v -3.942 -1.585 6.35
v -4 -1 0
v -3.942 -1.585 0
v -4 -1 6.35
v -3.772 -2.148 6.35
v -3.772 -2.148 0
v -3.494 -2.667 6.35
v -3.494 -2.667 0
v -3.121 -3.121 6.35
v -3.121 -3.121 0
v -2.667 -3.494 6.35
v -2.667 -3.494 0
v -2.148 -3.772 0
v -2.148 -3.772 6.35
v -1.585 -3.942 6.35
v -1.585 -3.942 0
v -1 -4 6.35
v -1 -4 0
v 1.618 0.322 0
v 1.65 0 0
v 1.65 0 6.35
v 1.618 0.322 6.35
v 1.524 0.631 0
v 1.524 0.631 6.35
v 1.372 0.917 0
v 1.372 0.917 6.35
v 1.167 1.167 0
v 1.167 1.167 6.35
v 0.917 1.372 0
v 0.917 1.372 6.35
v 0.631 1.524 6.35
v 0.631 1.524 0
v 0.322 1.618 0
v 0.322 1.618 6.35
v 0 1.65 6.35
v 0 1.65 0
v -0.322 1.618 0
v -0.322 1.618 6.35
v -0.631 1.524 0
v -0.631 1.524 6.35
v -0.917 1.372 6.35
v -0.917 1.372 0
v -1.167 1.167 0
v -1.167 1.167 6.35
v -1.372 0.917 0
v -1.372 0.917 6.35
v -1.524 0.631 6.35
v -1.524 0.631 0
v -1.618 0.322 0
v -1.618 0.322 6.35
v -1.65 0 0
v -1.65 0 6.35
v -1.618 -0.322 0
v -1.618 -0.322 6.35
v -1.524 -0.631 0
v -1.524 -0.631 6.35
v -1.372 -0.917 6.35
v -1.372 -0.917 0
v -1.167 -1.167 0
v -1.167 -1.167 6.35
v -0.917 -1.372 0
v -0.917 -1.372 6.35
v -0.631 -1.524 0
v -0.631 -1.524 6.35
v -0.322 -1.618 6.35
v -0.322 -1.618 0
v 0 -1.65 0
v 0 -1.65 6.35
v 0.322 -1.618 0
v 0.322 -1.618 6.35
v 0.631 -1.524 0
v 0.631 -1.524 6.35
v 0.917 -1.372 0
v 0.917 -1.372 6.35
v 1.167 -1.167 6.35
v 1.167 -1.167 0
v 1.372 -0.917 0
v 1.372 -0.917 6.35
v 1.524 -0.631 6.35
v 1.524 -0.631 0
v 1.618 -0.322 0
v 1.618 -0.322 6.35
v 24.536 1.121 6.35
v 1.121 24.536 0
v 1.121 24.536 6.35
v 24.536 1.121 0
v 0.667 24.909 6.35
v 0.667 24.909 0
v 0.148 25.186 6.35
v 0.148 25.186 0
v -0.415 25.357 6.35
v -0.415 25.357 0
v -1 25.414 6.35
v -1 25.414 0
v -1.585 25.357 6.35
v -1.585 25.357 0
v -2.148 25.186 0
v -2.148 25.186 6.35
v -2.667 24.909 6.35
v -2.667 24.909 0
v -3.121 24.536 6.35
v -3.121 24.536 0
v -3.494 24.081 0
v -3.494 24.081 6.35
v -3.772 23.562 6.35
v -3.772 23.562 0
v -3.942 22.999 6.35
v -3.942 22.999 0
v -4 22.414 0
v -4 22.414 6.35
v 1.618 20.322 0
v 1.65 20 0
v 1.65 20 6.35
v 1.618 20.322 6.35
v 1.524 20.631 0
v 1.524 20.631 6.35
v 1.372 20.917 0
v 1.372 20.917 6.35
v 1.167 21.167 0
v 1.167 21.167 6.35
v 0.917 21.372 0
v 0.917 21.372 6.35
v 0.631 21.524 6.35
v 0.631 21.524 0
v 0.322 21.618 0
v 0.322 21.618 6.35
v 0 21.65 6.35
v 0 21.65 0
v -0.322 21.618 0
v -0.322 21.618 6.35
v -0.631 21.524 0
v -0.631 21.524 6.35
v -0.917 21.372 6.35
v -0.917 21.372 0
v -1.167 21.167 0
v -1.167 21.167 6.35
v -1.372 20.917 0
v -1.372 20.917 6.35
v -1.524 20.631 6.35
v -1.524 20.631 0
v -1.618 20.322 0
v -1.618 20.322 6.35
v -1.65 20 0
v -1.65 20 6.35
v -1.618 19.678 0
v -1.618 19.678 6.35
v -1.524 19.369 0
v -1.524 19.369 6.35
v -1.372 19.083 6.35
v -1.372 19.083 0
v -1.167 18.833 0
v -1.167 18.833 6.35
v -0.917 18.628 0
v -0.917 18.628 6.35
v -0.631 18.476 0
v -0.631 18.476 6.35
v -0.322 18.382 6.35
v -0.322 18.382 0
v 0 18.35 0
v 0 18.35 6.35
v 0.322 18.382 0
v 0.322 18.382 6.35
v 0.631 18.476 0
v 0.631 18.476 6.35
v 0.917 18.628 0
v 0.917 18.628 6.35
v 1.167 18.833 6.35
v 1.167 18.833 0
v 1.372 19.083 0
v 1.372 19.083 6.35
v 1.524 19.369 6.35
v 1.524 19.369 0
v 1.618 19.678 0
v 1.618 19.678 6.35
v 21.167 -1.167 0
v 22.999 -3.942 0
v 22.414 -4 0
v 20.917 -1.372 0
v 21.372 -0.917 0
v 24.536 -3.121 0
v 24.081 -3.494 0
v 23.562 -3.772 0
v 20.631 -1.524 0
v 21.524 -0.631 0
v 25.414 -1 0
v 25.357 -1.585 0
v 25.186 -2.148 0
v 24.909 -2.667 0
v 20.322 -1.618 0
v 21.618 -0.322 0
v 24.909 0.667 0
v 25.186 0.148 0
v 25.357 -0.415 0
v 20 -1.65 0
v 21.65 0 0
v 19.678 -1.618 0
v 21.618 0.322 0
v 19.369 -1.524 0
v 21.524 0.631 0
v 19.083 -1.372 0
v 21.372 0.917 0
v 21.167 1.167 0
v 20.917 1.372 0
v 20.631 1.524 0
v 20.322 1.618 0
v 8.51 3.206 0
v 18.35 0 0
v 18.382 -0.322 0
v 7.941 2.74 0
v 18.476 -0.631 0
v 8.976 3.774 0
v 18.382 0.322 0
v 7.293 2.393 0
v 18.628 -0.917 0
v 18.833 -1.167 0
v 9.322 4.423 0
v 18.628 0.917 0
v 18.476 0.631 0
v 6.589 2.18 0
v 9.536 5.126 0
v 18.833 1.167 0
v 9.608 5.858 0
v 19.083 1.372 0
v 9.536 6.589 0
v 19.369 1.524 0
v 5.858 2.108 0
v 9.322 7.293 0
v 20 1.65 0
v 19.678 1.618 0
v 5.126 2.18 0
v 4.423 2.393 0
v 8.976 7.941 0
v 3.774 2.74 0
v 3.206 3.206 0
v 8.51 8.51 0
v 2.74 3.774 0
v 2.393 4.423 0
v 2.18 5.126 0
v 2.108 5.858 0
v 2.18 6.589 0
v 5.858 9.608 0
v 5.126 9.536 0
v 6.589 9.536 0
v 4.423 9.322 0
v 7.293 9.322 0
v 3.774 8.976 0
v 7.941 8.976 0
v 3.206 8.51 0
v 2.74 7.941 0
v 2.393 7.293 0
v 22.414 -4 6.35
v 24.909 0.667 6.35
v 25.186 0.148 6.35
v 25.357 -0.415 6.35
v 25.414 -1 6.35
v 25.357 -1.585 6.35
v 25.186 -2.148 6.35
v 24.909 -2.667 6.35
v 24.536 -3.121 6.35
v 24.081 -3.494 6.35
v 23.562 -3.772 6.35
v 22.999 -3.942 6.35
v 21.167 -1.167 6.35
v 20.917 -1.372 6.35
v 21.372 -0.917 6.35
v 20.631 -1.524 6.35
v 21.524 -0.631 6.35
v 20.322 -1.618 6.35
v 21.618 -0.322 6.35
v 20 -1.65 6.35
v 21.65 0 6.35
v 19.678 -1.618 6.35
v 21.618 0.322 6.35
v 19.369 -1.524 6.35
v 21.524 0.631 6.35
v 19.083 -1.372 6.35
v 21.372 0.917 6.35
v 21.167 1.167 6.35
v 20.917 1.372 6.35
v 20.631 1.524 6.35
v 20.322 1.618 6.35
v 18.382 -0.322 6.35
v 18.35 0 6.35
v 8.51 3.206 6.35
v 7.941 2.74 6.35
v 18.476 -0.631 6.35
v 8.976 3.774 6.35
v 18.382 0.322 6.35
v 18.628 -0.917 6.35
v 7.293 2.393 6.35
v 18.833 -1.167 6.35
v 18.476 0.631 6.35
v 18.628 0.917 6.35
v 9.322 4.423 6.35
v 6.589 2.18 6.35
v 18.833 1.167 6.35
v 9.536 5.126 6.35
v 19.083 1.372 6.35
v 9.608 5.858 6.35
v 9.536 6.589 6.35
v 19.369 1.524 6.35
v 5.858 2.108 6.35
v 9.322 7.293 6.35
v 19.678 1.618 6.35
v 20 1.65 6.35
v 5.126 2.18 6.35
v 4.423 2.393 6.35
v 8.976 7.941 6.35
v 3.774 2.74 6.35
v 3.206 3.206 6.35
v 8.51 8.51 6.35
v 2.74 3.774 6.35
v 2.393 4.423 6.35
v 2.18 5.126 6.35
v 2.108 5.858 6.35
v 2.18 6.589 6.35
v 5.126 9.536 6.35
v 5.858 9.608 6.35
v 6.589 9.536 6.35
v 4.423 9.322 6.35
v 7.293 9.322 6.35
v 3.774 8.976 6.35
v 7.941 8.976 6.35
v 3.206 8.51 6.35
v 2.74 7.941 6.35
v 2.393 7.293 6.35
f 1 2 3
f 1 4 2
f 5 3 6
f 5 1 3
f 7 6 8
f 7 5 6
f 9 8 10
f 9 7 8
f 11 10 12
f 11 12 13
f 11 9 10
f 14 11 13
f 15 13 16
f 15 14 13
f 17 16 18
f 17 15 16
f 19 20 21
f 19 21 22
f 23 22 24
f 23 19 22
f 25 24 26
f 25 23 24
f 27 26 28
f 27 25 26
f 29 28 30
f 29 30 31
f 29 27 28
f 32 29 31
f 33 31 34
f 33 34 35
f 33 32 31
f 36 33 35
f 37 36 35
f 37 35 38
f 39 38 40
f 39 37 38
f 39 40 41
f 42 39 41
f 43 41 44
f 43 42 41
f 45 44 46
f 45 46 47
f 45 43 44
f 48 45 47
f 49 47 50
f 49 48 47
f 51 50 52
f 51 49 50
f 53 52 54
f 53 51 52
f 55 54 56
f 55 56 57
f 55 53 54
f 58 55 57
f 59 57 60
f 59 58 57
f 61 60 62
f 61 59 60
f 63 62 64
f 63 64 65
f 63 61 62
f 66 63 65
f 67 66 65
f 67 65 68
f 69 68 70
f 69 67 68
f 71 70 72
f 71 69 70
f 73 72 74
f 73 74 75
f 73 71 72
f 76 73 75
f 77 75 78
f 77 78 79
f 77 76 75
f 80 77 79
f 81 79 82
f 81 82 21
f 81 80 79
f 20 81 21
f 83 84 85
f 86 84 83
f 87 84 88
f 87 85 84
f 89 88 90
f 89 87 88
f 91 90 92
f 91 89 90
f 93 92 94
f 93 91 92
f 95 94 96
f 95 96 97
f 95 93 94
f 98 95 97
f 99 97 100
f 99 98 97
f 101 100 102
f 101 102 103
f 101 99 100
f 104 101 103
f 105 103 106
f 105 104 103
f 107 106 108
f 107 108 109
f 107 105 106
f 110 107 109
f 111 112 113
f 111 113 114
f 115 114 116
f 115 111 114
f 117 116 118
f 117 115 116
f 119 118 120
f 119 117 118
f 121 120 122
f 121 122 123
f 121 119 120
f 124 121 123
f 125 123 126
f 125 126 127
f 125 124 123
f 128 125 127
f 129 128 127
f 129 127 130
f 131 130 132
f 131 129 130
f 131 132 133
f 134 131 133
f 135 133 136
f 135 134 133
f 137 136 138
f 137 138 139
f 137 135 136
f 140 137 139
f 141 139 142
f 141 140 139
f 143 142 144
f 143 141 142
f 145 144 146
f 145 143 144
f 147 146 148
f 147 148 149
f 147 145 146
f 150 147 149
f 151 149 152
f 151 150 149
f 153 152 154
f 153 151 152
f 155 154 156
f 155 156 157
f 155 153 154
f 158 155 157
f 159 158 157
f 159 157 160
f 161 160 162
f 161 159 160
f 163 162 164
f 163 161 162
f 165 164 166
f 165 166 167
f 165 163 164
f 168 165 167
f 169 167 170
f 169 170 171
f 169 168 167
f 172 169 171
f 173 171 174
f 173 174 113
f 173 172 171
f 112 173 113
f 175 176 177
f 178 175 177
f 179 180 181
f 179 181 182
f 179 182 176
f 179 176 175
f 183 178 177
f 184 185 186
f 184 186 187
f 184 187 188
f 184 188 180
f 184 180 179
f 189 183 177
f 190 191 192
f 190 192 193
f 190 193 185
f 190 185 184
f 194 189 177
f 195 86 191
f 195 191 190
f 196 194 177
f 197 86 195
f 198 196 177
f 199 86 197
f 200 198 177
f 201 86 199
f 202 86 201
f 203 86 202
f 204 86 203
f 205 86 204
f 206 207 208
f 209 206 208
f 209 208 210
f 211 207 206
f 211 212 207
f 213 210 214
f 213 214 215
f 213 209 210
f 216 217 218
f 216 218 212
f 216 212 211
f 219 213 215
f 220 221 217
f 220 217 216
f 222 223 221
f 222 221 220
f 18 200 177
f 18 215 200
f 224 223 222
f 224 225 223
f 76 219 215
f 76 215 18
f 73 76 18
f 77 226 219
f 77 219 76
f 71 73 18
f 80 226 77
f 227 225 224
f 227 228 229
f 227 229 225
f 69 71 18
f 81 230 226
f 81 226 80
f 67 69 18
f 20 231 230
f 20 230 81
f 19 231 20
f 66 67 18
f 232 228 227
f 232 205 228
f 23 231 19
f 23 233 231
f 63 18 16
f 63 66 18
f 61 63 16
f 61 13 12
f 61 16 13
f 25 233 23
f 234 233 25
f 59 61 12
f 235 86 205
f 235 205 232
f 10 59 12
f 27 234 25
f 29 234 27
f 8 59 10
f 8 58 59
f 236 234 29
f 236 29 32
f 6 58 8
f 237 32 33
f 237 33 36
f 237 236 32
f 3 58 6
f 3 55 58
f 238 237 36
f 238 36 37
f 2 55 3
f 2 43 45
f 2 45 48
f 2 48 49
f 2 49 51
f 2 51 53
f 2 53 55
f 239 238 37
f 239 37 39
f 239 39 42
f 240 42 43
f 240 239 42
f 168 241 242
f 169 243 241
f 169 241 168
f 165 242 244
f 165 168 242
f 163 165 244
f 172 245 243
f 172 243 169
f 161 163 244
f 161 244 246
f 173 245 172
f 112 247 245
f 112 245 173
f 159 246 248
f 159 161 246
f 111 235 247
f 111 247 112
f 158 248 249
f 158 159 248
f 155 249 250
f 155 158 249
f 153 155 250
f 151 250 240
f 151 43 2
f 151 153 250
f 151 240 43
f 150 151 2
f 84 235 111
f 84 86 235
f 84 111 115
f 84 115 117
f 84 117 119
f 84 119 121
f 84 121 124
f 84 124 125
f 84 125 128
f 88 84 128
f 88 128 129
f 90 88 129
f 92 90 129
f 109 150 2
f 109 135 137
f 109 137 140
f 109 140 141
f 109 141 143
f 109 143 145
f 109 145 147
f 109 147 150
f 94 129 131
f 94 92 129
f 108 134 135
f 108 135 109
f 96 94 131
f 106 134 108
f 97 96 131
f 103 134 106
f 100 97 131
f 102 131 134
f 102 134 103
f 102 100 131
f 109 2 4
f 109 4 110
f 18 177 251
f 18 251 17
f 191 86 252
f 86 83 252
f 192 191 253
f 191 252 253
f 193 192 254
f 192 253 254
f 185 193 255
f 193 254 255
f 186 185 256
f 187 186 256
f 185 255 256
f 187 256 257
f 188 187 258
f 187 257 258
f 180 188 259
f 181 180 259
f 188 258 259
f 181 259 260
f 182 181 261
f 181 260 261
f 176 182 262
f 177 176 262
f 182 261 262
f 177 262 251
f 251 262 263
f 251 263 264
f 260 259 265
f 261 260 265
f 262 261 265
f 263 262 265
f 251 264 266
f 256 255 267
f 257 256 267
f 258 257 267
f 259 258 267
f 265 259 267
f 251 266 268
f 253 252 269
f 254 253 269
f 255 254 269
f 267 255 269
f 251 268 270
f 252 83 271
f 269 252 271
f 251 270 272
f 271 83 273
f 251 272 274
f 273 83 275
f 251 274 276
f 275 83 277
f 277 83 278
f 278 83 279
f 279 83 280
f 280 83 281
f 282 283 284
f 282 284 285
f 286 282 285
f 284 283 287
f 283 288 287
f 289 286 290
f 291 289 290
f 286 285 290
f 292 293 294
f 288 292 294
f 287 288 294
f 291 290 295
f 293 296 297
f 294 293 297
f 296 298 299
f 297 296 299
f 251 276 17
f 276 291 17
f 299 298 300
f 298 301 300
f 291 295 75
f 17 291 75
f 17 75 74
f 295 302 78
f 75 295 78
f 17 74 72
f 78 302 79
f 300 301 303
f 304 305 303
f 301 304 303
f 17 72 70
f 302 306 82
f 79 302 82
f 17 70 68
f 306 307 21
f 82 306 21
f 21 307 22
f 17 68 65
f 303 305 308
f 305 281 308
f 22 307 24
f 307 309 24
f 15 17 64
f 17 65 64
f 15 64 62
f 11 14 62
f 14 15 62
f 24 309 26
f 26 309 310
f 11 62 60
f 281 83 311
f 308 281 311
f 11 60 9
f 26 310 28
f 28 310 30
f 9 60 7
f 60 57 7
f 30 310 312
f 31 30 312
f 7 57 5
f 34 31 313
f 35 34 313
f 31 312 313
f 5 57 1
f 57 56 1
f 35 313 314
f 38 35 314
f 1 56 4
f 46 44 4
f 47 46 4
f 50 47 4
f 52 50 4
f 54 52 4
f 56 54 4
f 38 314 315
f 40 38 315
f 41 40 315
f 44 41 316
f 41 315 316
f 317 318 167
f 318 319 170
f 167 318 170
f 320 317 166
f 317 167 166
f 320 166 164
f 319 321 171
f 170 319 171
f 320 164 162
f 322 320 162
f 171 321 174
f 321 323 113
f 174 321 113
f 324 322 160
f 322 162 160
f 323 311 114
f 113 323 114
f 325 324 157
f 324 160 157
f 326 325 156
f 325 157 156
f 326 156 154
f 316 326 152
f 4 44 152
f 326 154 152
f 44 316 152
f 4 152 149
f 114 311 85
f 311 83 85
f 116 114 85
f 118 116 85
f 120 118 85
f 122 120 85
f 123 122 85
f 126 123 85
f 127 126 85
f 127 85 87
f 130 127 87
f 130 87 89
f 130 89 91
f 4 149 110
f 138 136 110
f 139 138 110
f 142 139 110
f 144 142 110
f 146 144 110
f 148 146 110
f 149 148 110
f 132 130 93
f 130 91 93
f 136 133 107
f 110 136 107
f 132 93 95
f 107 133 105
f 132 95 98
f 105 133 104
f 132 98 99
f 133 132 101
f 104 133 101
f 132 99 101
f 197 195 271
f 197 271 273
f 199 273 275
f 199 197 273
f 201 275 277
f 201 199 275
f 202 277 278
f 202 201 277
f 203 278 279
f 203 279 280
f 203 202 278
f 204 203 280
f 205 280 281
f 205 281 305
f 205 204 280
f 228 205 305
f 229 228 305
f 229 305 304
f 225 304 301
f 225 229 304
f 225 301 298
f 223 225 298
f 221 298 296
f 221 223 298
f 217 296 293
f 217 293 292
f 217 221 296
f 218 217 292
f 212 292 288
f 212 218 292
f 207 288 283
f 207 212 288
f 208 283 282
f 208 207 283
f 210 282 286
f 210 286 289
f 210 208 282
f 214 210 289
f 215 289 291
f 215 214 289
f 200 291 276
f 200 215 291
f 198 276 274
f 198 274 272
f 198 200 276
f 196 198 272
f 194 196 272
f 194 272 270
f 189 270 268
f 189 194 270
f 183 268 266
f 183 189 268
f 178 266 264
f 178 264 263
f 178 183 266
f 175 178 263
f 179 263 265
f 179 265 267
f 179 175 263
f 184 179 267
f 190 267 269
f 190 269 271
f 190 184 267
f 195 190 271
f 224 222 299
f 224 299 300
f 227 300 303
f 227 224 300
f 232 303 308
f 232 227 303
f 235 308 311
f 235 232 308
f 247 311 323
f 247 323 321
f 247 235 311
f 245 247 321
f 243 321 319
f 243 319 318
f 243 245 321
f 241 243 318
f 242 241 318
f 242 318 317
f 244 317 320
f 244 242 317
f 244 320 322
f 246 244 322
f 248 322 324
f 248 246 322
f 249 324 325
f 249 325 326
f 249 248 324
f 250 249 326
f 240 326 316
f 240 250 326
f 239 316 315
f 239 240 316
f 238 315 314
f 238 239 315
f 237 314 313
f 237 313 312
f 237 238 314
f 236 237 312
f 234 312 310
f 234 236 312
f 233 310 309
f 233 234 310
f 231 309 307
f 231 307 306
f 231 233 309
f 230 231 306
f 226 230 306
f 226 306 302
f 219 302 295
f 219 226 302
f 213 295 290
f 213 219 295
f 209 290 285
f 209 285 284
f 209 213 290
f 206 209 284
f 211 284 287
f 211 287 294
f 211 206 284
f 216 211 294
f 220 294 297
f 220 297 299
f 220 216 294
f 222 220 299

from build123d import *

# Parameters (mm, degrees)
SKETCH1_R           = 1.65
SKETCH1_R_2         = 3.75
BOSS_EXTRUDE1_DEPTH = 6.35
FILLET1_R           = 3


with BuildPart() as part:
    # Sketch1 → Boss-Extrude1 (new body)
    with BuildSketch(Plane.XY):
        Polygon((-4, 29.656854249), (29.656854249, -4), (-4, -4), align=None)
        with Locations((0, 20)):
            Circle(SKETCH1_R, mode=Mode.SUBTRACT)
        with Locations((20, 0)):
            Circle(SKETCH1_R, mode=Mode.SUBTRACT)
        Circle(SKETCH1_R, mode=Mode.SUBTRACT)
        with Locations((5.857864376, 5.857864376)):
            Circle(SKETCH1_R_2, mode=Mode.SUBTRACT)
    extrude(amount=BOSS_EXTRUDE1_DEPTH)

    # Fillet1
    fillet1_edges = [part.edges().sort_by_distance(p)[0] for p in [
        (-4, 29.656854249, 3.175),
        (29.656854249, -4, 3.175),
        (-4, -4, 3.175),
    ]]
    fillet(fillet1_edges, radius=FILLET1_R)


solid = part.part
